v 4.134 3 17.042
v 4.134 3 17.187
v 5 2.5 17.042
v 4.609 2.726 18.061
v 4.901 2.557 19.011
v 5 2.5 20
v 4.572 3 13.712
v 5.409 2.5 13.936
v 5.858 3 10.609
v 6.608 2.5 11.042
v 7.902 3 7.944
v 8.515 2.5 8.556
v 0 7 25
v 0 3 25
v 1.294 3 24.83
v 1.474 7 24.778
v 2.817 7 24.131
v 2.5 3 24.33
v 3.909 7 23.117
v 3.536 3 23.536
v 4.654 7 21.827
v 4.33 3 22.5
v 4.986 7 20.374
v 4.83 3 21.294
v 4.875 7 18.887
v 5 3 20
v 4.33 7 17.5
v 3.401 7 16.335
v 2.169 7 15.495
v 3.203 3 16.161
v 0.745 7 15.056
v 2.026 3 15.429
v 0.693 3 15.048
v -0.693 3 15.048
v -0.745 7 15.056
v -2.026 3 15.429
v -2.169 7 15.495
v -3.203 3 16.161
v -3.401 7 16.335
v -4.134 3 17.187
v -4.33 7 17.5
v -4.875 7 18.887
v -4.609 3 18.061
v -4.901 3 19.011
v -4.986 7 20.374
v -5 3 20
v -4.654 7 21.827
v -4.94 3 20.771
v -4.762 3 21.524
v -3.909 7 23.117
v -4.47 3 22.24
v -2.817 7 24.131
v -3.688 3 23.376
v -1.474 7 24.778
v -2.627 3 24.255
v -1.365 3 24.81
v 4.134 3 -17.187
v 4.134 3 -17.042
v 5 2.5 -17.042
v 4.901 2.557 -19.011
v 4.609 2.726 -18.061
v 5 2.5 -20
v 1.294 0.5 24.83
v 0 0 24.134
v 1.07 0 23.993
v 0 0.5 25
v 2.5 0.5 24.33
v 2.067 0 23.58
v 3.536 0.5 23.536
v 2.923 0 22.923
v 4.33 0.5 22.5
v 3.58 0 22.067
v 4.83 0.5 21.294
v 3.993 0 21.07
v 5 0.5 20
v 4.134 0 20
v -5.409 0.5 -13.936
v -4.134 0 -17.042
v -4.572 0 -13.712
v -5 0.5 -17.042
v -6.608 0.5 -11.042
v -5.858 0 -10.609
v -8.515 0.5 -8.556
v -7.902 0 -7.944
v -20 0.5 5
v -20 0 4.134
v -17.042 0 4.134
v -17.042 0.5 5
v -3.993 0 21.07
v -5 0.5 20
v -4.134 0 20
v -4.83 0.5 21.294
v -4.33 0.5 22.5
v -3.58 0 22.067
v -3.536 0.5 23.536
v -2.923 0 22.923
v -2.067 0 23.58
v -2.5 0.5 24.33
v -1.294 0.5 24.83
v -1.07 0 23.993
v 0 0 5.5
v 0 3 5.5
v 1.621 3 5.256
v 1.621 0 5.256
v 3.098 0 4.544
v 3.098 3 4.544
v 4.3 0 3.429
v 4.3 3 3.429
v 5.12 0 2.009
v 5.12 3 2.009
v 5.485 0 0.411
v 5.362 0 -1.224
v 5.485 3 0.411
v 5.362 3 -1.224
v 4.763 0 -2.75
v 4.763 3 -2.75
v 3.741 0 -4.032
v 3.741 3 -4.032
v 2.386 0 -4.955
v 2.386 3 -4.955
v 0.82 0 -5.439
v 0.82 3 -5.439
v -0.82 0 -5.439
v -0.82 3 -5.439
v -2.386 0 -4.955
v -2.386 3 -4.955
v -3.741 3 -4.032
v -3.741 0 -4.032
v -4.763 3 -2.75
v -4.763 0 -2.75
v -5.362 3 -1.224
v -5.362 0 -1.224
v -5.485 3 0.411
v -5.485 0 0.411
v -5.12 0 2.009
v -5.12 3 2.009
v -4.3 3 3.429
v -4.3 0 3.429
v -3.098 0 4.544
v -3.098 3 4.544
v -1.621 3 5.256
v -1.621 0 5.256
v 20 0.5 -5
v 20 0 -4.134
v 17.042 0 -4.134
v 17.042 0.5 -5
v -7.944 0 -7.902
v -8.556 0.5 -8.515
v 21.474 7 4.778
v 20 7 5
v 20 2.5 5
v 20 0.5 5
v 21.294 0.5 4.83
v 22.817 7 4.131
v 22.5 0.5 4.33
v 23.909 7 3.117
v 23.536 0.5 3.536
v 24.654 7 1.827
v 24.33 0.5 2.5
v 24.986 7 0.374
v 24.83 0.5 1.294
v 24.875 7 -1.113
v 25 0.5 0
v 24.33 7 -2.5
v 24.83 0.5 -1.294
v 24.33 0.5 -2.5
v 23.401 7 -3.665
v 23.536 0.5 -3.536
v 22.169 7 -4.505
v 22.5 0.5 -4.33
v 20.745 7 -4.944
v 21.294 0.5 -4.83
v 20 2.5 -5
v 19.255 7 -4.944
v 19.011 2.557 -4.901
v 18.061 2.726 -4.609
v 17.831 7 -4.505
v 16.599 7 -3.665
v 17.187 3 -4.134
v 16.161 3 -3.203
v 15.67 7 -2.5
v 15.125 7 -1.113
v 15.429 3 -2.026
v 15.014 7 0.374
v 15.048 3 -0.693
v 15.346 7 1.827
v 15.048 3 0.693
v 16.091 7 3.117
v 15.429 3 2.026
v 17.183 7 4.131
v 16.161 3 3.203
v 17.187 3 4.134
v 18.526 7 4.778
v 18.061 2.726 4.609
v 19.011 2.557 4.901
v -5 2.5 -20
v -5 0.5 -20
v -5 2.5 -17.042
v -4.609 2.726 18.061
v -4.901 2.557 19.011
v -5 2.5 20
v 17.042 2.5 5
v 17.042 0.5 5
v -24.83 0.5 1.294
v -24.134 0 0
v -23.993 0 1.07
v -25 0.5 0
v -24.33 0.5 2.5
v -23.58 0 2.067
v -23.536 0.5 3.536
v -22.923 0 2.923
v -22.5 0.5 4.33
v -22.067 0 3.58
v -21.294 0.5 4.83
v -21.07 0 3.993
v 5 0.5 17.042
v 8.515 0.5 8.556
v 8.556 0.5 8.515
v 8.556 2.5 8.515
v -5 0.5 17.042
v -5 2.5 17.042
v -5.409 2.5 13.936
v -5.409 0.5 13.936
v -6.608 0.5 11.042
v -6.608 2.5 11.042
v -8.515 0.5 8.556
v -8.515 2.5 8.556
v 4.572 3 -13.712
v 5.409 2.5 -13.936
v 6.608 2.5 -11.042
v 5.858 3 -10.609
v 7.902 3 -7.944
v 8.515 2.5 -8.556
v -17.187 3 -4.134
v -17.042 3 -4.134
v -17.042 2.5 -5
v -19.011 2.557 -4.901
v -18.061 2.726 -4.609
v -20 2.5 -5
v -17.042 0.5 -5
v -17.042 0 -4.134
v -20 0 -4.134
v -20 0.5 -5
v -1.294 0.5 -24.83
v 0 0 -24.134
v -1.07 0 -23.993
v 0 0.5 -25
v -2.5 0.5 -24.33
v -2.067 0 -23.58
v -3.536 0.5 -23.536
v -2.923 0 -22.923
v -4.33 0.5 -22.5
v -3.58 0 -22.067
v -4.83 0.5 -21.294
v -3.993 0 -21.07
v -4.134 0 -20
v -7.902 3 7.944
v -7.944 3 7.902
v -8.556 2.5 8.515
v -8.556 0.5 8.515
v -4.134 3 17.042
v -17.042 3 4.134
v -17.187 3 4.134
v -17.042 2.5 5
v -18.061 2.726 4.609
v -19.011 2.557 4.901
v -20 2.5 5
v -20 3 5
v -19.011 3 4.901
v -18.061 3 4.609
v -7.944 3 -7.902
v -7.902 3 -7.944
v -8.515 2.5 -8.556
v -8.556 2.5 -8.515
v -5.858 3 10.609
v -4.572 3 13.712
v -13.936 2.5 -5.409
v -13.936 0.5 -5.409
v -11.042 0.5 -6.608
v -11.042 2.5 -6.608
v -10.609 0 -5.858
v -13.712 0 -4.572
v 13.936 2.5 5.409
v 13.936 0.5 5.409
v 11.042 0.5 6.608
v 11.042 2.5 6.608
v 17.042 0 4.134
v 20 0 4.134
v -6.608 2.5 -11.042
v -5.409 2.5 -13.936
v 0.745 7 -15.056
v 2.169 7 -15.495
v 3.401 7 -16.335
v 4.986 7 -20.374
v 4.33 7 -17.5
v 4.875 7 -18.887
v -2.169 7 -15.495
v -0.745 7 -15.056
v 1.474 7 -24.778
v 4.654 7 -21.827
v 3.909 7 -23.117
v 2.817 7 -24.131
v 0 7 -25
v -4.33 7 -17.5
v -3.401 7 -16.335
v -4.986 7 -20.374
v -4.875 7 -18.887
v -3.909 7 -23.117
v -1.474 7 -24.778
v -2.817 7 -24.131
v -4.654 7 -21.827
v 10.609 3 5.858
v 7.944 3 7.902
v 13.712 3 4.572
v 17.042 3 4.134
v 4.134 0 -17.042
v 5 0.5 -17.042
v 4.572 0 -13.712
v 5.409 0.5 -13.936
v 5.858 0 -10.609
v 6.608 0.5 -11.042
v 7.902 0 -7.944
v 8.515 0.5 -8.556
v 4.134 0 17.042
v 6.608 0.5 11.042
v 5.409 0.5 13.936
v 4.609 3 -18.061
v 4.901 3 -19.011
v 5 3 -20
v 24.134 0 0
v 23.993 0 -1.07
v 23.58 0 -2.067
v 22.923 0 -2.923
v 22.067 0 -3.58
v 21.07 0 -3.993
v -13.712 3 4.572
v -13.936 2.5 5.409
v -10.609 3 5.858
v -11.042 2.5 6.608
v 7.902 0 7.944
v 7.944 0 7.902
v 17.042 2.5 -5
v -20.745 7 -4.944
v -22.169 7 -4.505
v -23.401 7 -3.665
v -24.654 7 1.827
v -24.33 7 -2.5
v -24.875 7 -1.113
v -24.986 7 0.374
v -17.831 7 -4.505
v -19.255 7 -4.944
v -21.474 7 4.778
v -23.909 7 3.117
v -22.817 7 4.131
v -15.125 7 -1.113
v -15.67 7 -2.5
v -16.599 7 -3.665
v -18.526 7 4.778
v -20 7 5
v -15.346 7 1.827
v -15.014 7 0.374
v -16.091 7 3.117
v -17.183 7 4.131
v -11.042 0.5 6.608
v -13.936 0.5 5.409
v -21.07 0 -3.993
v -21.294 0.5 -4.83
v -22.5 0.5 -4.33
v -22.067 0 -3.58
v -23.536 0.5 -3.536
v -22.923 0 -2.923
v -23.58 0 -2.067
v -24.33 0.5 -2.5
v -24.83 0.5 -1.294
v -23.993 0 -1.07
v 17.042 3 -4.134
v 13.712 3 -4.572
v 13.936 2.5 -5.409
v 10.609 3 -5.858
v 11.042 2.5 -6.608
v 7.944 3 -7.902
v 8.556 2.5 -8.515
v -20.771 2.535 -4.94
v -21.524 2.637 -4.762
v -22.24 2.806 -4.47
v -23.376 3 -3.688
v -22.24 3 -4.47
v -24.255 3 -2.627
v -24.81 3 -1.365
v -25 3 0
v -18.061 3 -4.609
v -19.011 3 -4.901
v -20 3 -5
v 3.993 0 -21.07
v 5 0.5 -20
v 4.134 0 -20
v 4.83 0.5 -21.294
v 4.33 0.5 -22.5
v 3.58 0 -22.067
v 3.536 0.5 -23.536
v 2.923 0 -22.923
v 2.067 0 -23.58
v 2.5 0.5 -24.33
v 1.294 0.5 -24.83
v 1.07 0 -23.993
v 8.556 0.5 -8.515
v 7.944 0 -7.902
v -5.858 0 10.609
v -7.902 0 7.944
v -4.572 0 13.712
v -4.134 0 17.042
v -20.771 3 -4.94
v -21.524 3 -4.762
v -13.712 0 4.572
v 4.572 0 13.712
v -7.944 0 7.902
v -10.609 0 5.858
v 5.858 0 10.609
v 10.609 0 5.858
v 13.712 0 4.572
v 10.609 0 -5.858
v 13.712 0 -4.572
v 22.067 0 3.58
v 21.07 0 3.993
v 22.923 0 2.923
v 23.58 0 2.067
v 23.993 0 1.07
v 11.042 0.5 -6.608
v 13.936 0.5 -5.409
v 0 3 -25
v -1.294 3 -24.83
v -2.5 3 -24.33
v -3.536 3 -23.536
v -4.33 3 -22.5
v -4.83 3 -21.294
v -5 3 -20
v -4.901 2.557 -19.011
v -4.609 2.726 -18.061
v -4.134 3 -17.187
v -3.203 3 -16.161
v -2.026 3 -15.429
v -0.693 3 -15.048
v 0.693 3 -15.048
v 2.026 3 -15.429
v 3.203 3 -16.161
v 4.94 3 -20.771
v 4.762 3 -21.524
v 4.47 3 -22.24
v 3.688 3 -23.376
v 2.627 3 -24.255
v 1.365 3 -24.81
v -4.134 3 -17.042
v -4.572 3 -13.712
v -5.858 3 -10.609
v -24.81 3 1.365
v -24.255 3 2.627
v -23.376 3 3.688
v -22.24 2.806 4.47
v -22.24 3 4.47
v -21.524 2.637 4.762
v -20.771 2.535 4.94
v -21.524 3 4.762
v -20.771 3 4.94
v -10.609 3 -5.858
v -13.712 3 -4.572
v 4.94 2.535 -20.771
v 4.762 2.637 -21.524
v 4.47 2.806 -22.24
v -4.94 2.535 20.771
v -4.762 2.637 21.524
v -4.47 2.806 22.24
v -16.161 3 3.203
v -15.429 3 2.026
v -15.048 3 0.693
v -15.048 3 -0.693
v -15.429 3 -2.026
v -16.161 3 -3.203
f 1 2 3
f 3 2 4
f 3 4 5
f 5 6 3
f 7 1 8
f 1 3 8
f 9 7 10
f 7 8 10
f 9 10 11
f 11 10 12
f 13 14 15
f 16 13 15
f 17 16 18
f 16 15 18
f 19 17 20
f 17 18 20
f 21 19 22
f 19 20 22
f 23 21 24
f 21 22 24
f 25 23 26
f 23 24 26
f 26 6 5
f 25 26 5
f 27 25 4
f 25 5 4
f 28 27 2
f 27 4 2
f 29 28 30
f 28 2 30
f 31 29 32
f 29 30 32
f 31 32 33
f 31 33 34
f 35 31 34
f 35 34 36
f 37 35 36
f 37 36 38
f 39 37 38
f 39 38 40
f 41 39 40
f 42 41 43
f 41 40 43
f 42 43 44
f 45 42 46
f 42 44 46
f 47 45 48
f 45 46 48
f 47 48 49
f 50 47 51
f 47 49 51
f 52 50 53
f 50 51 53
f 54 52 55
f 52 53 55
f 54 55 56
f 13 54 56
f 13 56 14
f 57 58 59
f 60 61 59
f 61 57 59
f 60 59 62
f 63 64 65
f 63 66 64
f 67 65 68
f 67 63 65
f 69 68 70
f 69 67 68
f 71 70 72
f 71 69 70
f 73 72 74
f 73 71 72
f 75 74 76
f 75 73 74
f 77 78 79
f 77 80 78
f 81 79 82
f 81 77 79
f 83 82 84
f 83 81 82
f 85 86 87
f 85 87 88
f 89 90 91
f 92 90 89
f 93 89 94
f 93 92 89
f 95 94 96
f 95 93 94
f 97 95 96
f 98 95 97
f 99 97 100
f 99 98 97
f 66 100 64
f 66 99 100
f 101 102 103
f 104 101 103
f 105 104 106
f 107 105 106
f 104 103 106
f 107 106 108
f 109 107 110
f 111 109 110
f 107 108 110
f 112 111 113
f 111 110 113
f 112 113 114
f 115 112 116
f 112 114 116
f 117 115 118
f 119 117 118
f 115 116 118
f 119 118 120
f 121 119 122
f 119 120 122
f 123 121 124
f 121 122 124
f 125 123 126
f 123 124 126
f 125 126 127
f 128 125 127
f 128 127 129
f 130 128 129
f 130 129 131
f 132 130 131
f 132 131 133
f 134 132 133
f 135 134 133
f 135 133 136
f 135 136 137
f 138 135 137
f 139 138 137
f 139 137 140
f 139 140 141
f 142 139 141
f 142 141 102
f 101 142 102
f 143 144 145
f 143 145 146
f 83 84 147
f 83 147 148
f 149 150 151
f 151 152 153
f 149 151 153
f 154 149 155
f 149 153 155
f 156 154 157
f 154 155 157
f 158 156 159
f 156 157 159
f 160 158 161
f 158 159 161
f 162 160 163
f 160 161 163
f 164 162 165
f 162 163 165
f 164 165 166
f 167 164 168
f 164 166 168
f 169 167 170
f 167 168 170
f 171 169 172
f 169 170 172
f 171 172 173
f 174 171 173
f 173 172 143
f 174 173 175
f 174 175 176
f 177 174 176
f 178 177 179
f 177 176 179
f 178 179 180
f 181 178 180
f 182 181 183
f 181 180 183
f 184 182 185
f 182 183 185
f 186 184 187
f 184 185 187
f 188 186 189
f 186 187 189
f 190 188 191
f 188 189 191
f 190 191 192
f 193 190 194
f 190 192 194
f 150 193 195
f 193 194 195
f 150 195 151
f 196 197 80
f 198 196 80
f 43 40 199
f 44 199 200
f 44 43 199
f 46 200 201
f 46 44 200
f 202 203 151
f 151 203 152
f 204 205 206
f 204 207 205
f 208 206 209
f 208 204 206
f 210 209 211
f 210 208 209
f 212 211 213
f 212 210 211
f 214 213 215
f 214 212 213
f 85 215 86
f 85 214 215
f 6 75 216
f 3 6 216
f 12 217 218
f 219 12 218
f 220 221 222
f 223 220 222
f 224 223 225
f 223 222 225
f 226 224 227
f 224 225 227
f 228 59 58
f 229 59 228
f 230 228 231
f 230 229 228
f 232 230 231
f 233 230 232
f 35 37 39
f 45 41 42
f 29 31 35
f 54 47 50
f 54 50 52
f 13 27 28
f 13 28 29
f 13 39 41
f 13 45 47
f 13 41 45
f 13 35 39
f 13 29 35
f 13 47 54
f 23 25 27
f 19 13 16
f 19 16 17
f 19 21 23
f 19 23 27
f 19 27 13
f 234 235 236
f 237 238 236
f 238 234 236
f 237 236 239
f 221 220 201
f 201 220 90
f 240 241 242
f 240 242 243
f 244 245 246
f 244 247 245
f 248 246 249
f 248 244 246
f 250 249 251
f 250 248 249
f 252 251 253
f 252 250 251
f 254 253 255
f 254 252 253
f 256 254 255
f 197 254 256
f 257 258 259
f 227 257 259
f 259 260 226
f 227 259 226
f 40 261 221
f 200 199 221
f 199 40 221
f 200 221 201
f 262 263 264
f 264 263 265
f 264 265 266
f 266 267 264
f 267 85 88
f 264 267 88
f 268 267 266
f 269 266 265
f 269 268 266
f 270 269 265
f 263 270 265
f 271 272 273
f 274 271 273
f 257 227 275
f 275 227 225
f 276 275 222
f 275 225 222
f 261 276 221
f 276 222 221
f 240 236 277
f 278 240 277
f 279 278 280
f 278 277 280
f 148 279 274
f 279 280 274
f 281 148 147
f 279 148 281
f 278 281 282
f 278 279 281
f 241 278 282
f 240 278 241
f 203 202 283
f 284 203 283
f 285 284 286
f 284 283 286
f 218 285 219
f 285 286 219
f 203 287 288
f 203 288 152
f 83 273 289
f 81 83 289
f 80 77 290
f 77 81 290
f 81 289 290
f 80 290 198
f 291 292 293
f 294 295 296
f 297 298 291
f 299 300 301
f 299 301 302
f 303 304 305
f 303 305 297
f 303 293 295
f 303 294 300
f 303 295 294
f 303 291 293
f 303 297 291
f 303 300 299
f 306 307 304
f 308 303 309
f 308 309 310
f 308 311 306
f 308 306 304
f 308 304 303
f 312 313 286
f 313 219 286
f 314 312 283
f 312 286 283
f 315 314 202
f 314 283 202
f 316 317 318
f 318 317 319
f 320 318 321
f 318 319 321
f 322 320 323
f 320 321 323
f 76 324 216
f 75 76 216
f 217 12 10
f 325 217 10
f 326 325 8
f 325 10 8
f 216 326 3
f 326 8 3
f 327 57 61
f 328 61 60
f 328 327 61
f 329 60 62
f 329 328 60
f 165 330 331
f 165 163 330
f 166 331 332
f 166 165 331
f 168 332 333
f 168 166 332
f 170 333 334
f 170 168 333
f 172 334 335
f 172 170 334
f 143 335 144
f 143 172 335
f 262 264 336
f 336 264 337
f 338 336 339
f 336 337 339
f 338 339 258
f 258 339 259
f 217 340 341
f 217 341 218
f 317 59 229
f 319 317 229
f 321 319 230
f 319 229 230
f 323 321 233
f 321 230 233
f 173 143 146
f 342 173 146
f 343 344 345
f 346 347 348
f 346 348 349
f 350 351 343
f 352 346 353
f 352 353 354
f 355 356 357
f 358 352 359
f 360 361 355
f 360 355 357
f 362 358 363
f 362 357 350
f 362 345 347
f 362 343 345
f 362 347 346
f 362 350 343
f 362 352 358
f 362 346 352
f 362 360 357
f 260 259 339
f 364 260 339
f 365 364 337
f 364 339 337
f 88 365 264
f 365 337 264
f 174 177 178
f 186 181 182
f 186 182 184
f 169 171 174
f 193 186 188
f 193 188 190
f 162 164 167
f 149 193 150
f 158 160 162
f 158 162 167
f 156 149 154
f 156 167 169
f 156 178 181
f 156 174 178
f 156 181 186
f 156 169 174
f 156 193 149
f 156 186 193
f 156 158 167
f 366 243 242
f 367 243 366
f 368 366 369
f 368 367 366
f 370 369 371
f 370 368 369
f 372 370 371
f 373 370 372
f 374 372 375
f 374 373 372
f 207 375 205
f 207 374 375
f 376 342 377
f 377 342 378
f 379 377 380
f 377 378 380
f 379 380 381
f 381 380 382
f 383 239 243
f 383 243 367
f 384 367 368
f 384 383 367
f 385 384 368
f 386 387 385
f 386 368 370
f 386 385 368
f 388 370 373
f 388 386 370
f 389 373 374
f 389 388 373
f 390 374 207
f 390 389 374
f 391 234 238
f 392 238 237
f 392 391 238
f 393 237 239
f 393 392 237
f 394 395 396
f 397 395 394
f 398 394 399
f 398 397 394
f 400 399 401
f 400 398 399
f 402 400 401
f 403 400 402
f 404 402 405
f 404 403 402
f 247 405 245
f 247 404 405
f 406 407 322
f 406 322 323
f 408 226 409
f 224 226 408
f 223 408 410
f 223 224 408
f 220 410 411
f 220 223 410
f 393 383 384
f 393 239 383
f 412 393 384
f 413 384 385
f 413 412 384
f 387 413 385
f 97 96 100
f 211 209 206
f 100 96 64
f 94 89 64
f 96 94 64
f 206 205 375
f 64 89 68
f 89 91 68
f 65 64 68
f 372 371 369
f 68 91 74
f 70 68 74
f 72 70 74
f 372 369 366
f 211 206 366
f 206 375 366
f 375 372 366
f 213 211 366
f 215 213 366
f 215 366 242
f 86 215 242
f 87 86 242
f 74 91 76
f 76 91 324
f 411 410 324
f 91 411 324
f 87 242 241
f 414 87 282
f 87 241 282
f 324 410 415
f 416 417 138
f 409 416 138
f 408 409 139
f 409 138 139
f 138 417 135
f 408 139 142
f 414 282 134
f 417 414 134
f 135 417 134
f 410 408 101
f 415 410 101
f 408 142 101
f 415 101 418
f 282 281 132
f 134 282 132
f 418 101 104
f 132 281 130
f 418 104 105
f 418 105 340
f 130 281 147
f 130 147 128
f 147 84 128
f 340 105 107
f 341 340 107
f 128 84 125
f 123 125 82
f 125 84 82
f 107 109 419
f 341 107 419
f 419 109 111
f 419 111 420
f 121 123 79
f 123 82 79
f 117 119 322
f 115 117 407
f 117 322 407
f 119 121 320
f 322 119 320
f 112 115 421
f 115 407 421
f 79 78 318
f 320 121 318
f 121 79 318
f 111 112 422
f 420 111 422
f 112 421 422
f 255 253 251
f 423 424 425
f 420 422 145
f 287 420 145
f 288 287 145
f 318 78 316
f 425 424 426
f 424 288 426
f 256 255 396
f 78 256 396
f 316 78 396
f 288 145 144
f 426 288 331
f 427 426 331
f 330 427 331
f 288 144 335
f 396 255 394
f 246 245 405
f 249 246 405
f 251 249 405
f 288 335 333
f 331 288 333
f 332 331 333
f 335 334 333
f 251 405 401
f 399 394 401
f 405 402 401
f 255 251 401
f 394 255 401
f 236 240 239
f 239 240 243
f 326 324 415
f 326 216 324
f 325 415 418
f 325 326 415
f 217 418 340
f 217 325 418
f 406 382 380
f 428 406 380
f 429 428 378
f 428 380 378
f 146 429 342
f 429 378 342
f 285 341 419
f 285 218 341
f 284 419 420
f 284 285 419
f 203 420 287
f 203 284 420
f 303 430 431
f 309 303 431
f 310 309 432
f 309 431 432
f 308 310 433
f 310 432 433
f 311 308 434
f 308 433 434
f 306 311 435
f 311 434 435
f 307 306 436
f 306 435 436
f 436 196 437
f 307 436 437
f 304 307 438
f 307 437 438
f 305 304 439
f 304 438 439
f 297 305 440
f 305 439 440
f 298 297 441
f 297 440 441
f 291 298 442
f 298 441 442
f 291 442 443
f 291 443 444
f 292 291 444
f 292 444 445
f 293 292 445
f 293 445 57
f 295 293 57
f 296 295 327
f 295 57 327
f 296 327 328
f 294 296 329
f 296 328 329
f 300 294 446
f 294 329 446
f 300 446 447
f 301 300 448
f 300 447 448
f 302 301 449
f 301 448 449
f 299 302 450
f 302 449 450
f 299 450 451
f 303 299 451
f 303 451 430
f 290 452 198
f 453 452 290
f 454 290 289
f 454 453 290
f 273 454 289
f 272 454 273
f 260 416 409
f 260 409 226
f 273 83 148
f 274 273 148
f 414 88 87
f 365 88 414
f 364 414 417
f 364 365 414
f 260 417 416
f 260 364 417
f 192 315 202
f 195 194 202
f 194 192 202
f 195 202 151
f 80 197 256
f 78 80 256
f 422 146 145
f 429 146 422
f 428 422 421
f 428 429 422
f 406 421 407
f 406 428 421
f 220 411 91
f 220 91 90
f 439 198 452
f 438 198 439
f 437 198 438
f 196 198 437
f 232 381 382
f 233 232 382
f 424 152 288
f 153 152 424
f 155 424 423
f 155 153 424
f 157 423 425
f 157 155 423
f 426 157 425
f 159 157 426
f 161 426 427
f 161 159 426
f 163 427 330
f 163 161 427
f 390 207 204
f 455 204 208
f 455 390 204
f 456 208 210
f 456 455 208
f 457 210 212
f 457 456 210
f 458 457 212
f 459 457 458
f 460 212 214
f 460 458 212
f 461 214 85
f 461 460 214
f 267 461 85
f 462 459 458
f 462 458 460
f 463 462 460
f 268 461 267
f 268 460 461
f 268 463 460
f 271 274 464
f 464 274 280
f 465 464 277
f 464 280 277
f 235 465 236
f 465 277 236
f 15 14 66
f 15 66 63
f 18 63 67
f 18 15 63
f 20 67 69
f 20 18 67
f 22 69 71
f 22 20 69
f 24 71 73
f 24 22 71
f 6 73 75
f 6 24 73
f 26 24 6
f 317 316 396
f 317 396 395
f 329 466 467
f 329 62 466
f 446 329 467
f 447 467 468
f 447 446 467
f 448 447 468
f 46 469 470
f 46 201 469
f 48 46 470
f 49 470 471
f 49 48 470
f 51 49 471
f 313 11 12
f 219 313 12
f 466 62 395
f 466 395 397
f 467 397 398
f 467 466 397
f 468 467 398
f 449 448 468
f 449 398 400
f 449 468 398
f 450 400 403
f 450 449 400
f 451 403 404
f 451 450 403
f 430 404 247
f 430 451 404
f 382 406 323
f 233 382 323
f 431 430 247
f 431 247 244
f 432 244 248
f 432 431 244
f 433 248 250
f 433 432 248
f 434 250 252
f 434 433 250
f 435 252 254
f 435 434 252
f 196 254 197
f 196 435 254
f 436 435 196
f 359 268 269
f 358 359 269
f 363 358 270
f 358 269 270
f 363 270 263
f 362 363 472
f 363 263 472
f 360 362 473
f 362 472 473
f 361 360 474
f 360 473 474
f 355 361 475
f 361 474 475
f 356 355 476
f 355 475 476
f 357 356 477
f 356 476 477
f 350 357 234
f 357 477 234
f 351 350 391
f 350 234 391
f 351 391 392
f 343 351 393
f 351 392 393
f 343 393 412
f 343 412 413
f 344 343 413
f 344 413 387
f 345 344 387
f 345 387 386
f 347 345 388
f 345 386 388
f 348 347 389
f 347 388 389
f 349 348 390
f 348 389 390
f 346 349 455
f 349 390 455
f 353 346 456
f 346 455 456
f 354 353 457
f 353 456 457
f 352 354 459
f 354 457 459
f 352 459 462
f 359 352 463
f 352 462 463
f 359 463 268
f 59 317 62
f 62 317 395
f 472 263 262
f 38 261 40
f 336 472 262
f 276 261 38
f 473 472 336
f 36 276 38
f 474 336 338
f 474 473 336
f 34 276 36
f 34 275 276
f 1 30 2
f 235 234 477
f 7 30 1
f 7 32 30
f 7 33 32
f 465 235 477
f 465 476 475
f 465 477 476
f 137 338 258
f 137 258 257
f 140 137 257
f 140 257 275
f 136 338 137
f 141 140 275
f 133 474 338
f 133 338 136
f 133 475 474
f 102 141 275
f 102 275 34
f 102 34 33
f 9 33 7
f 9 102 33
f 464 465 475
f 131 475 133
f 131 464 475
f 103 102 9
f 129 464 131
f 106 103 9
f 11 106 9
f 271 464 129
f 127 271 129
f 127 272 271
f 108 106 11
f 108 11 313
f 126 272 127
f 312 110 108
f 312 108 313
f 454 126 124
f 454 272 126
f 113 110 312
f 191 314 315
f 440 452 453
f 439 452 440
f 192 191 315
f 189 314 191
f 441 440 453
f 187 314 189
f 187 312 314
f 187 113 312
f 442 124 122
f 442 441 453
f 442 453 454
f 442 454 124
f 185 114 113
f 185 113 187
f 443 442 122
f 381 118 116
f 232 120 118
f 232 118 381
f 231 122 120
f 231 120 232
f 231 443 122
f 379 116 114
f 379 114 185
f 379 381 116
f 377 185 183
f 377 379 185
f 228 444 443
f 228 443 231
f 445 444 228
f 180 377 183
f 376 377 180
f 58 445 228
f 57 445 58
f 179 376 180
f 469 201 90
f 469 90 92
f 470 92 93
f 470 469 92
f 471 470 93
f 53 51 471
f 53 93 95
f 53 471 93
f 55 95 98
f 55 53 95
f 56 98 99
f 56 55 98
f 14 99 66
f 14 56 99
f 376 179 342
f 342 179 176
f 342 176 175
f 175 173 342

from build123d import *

# Parameters (mm, degrees)
BOSS_EXTRUDE2_DEPTH = 3
SKETCH3_R           = 5
BOSS_EXTRUDE3_DEPTH = 4
FILLET2_R           = 12
CUT_EXTRUDE1_REACH  = 37.581
SKETCH4_R           = 5.5
CHAMFER1_SIZE       = 0.866025404
CHAMFER1_SIZE_2     = 0.5


with BuildPart() as part:
    # Sketch2 → Boss-Extrude2 (new body)
    with BuildSketch(Plane(origin=(0, 0, 0), x_dir=(1, 0, 0), z_dir=(0, 1, 0))):
        Polygon((-5, 25), (-5, 12.071067812), (-12.071067812, 5), (-25, 5), (-25, -5), (-12.071067812, -5), (-5, -12.071067812), (-5, -25), (5, -25), (5, -12.071067812), (12.071067812, -5), (25, -5), (25, 5), (12.071067812, 5), (5, 12.071067812), (5, 25), align=None)
    extrude(amount=BOSS_EXTRUDE2_DEPTH)

    # Sketch3 → Boss-Extrude3 (add)
    with BuildSketch(Plane(origin=(0, 3, 0), x_dir=(1, 0, 0), z_dir=(0, 1, 0))):
        with Locations(Location((-20, 0, 0), (0, 0, 270))):
            Circle(SKETCH3_R)
        with Locations(Location((0, 20, 0), (0, 0, 90))):
            Circle(SKETCH3_R)
        with Locations(Location((20, 0, 0), (0, 0, 270))):
            Circle(SKETCH3_R)
        with Locations(Location((0, -20, 0), (0, 0, 270))):
            Circle(SKETCH3_R)
    extrude(amount=BOSS_EXTRUDE3_DEPTH)

    # Fillet2
    fillet2_edges = [part.edges().sort_by_distance(p)[0] for p in [
        (5, 1.5, -12.071067812),
        (12.071067812, 1.5, -5),
        (12.071067812, 1.5, 5),
        (5, 1.5, 12.071067812),
        (-5, 1.5, 12.071067812),
        (-12.071067812, 1.5, 5),
        (-12.071067812, 1.5, -5),
        (-5, 1.5, -12.071067812),
    ]]
    fillet(fillet2_edges, radius=FILLET2_R)

    # Sketch4 → Cut-Extrude1 (cut, up to next)
    with BuildSketch(Plane(origin=(0, 3, 0), x_dir=(1, 0, 0), z_dir=(0, 1, 0)), mode=Mode.PRIVATE) as cut_extrude1_sk1:
        with BuildLine():
            ThreePointArc((-25, 0), (-23.535533906, -3.535533906), (-20, -5))
            Line((-20, -5), (-25, -5))
            Line((-25, -5), (-25, 0))
        make_face()
    cut_extrude1_tool1 = extrude(cut_extrude1_sk1.sketch, amount=-CUT_EXTRUDE1_REACH, mode=Mode.PRIVATE) & part.part
    # Sketch4 → Cut-Extrude1 (cut, up to next)
    with BuildSketch(Plane(origin=(0, 3, 0), x_dir=(1, 0, 0), z_dir=(0, 1, 0)), mode=Mode.PRIVATE) as cut_extrude1_sk2:
        with BuildLine():
            ThreePointArc((-20, 5), (-23.535533906, 3.535533906), (-25, 0))
            Line((-25, 0), (-25, 5))
            Line((-25, 5), (-20, 5))
        make_face()
    cut_extrude1_tool2 = extrude(cut_extrude1_sk2.sketch, amount=-CUT_EXTRUDE1_REACH, mode=Mode.PRIVATE) & part.part
    # Sketch4 → Cut-Extrude1 (cut, up to next)
    with BuildSketch(Plane(origin=(0, 3, 0), x_dir=(1, 0, 0), z_dir=(0, 1, 0)), mode=Mode.PRIVATE) as cut_extrude1_sk3:
        with BuildLine():
            ThreePointArc((0, 25), (-3.535533906, 23.535533906), (-5, 20))
            Line((-5, 20), (-5, 25))
            Line((-5, 25), (0, 25))
        make_face()
    cut_extrude1_tool3 = extrude(cut_extrude1_sk3.sketch, amount=-CUT_EXTRUDE1_REACH, mode=Mode.PRIVATE) & part.part
    # Sketch4 → Cut-Extrude1 (cut, up to next)
    with BuildSketch(Plane(origin=(0, 3, 0), x_dir=(1, 0, 0), z_dir=(0, 1, 0)), mode=Mode.PRIVATE) as cut_extrude1_sk4:
        with BuildLine():
            ThreePointArc((5, 20), (3.535533906, 23.535533906), (0, 25))
            Line((0, 25), (5, 25))
            Line((5, 25), (5, 20))
        make_face()
    cut_extrude1_tool4 = extrude(cut_extrude1_sk4.sketch, amount=-CUT_EXTRUDE1_REACH, mode=Mode.PRIVATE) & part.part
    # Sketch4 → Cut-Extrude1 (cut, up to next)
    with BuildSketch(Plane(origin=(0, 3, 0), x_dir=(1, 0, 0), z_dir=(0, 1, 0)), mode=Mode.PRIVATE) as cut_extrude1_sk5:
        with BuildLine():
            ThreePointArc((25, 0), (23.535533906, 3.535533906), (20, 5))
            Line((20, 5), (25, 5))
            Line((25, 5), (25, 0))
        make_face()
    cut_extrude1_tool5 = extrude(cut_extrude1_sk5.sketch, amount=-CUT_EXTRUDE1_REACH, mode=Mode.PRIVATE) & part.part
    # Sketch4 → Cut-Extrude1 (cut, up to next)
    with BuildSketch(Plane(origin=(0, 3, 0), x_dir=(1, 0, 0), z_dir=(0, 1, 0)), mode=Mode.PRIVATE) as cut_extrude1_sk6:
        with BuildLine():
            ThreePointArc((20, -5), (23.535533906, -3.535533906), (25, 0))
            Line((25, 0), (25, -5))
            Line((25, -5), (20, -5))
        make_face()
    cut_extrude1_tool6 = extrude(cut_extrude1_sk6.sketch, amount=-CUT_EXTRUDE1_REACH, mode=Mode.PRIVATE) & part.part
    # Sketch4 → Cut-Extrude1 (cut, up to next)
    with BuildSketch(Plane(origin=(0, 3, 0), x_dir=(1, 0, 0), z_dir=(0, 1, 0)), mode=Mode.PRIVATE) as cut_extrude1_sk7:
        with BuildLine():
            ThreePointArc((0, -25), (3.535533906, -23.535533906), (5, -20))
            Line((5, -20), (5, -25))
            Line((5, -25), (0, -25))
        make_face()
    cut_extrude1_tool7 = extrude(cut_extrude1_sk7.sketch, amount=-CUT_EXTRUDE1_REACH, mode=Mode.PRIVATE) & part.part
    # Sketch4 → Cut-Extrude1 (cut, up to next)
    with BuildSketch(Plane(origin=(0, 3, 0), x_dir=(1, 0, 0), z_dir=(0, 1, 0)), mode=Mode.PRIVATE) as cut_extrude1_sk8:
        with BuildLine():
            ThreePointArc((-5, -20), (-3.535533906, -23.535533906), (0, -25))
            Line((0, -25), (-5, -25))
            Line((-5, -25), (-5, -20))
        make_face()
    cut_extrude1_tool8 = extrude(cut_extrude1_sk8.sketch, amount=-CUT_EXTRUDE1_REACH, mode=Mode.PRIVATE) & part.part
    # Sketch4 → Cut-Extrude1 (cut, up to next)
    with BuildSketch(Plane(origin=(0, 3, 0), x_dir=(1, 0, 0), z_dir=(0, 1, 0)), mode=Mode.PRIVATE) as cut_extrude1_sk9:
        with Locations(Location((0, 0, 0), (0, 0, 270))):
            Circle(SKETCH4_R)
    cut_extrude1_tool9 = extrude(cut_extrude1_sk9.sketch, amount=-CUT_EXTRUDE1_REACH, mode=Mode.PRIVATE) & part.part
    add(cut_extrude1_tool1.solids().sort_by_distance((-23.88316, 3, 3.88316))[0], mode=Mode.SUBTRACT)
    add(cut_extrude1_tool2.solids().sort_by_distance((-23.88316, 3, -3.88316))[0], mode=Mode.SUBTRACT)
    add(cut_extrude1_tool3.solids().sort_by_distance((-3.88316, 3, -23.88316))[0], mode=Mode.SUBTRACT)
    add(cut_extrude1_tool4.solids().sort_by_distance((3.88316, 3, -23.88316))[0], mode=Mode.SUBTRACT)
    add(cut_extrude1_tool5.solids().sort_by_distance((23.88316, 3, -3.88316))[0], mode=Mode.SUBTRACT)
    add(cut_extrude1_tool6.solids().sort_by_distance((23.88316, 3, 3.88316))[0], mode=Mode.SUBTRACT)
    add(cut_extrude1_tool7.solids().sort_by_distance((3.88316, 3, 23.88316))[0], mode=Mode.SUBTRACT)
    add(cut_extrude1_tool8.solids().sort_by_distance((-3.88316, 3, 23.88316))[0], mode=Mode.SUBTRACT)
    add(cut_extrude1_tool9.solids().sort_by_distance((0, 3, 0))[0], mode=Mode.SUBTRACT)

    # Chamfer1
    # the kernel refuses this chamfer: 0.866025404, 0.5 mm, written as the material it takes off along each edge
    with BuildSketch(Plane(origin=(17.04163056, 3, 17), x_dir=(-0.7071067811865476, 0, -0.7071067811865475), z_dir=(-0.7071067811865475, 0, 0.7071067811865476))) as chamfer1_piece_1:
        Polygon((12 + CHAMFER1_SIZE, 0), (12, CHAMFER1_SIZE_2), (12, 0), align=None)
    revolve(axis=Axis((17.04163056, 3, 17), (0, -1, 0)), revolution_arc=45, mode=Mode.SUBTRACT)
    with BuildSketch(Plane(origin=(17.04163056, 0, 17), x_dir=(-0.7071067811865476, 0, -0.7071067811865475), z_dir=(-0.7071067811865475, 0, 0.7071067811865476))) as chamfer1_piece_2:
        Polygon((12 + CHAMFER1_SIZE, 0), (12, -CHAMFER1_SIZE_2), (12, 0), align=None)
    revolve(axis=Axis((17.04163056, 0, 17), (0, -1, 0)), revolution_arc=45, mode=Mode.SUBTRACT)
    with BuildSketch(Plane(origin=(17, 0, 17.04163056), x_dir=(-1, 0, 0), z_dir=(0, 0, 1))) as chamfer1_piece_3:
        Polygon((12 + CHAMFER1_SIZE, 0), (12, -CHAMFER1_SIZE_2), (12, 0), align=None)
    revolve(axis=Axis((17, 0, 17.04163056), (0, -1, 0)), revolution_arc=45, mode=Mode.SUBTRACT)
    with BuildSketch(Plane(origin=(17, 3, 17.04163056), x_dir=(-1, 0, 0), z_dir=(0, 0, 1))) as chamfer1_piece_4:
        Polygon((12 + CHAMFER1_SIZE, 0), (12, CHAMFER1_SIZE_2), (12, 0), align=None)
    revolve(axis=Axis((17, 3, 17.04163056), (0, -1, 0)), revolution_arc=45, mode=Mode.SUBTRACT)
    with BuildSketch(Plane(origin=(5, 0, 20), x_dir=(-0.9998132206222079, -0.019326765612700636, 0), z_dir=(0, 0, -1)), Plane(origin=(-20, 0, 5), x_dir=(0, -0.019326765612700636, -0.9998132206222079), z_dir=(1, 0, 0)), Plane(origin=(20, 0, -5), x_dir=(0, -0.019326765612700636, 0.9998132206222079), z_dir=(-1, 0, 0)), Plane(origin=(-5, 0, 17.04163056), x_dir=(0.9998132206222079, -0.019326765612700636, 0), z_dir=(0, 0, 1)), Plane(origin=(-17.04163056, 0, -5), x_dir=(0, -0.019326765612700636, 0.9998132206222079), z_dir=(-1, 0, 0)), Plane(origin=(5, 0, -17.04163056), x_dir=(-0.9998132206222079, -0.019326765612700636, 0), z_dir=(0, 0, -1)), Plane(origin=(17.04163056, 0, 5), x_dir=(0, -0.019326765612700636, -0.9998132206222079), z_dir=(1, 0, 0))) as chamfer1_piece_5:
        Polygon((CHAMFER1_SIZE * 0.999813220373, CHAMFER1_SIZE * 0.0193267656079), (-CHAMFER1_SIZE_2 * 0.0193267656127, CHAMFER1_SIZE_2 * 0.999813220622), (0, 0), align=None)
    extrude(amount=2.95836944, mode=Mode.SUBTRACT)
    with BuildSketch(Plane(origin=(5, 3, 22.240481985), x_dir=(-0.9998132206222079, 0.019326765612700702, 0), z_dir=(0, 0, -1))) as chamfer1_piece_6_section:
        Polygon((CHAMFER1_SIZE * 0.999813220373, -CHAMFER1_SIZE * 0.0193267656079), (-CHAMFER1_SIZE_2 * 0.0193267656127, -CHAMFER1_SIZE_2 * 0.999813220622), (0, 0), align=None)
    chamfer1_piece_6 = extrude(amount=5.198851425, mode=Mode.PRIVATE)
    chamfer1_piece_6 = chamfer1_piece_6 - Plane(origin=(0, 2.808146468, 20), x_dir=(0, 0, 1), z_dir=(0, 1, 0)) * Cylinder(5, 14, mode=Mode.PRIVATE)
    add(chamfer1_piece_6, mode=Mode.SUBTRACT)
    with BuildSketch(Plane(origin=(-5, 0, -20), x_dir=(-0.057893862402671484, 0.9983227437537926, 0), z_dir=(0, 0, 1))) as chamfer1_piece_7:
        Polygon((CHAMFER1_SIZE_2 * 0.998322743754, -CHAMFER1_SIZE_2 * 0.0578938624027), (-CHAMFER1_SIZE * 0.0578938623883, -CHAMFER1_SIZE * 0.998322743505), (0, 0), align=None)
    extrude(amount=2.95836944, mode=Mode.SUBTRACT)
    with BuildSketch(Plane(origin=(-5, 3, -22.240481983), x_dir=(-0.05789386240267147, -0.9983227437537926, 0), z_dir=(0, 0, 1))) as chamfer1_piece_8_section:
        Polygon((CHAMFER1_SIZE_2 * 0.998322743754, CHAMFER1_SIZE_2 * 0.0578938624027), (-CHAMFER1_SIZE * 0.0578938623883, CHAMFER1_SIZE * 0.998322743505), (0, 0), align=None)
    chamfer1_piece_8 = extrude(amount=5.198851422, mode=Mode.PRIVATE)
    chamfer1_piece_8 = chamfer1_piece_8 - Plane(origin=(0, 2.808146468, -20), x_dir=(0, 0, -1), z_dir=(0, 1, 0)) * Cylinder(5, 14, mode=Mode.PRIVATE)
    add(chamfer1_piece_8, mode=Mode.SUBTRACT)
    with BuildSketch(Plane(origin=(0, 0, 20), x_dir=(-1, 0, 0), z_dir=(0, 0, -1))) as chamfer1_piece_9:
        Polygon((5 - CHAMFER1_SIZE, 0), (5, CHAMFER1_SIZE_2), (5, 0), align=None)
    revolve(axis=Axis((0, 0, 20), (0, 1, 0)), revolution_arc=90, mode=Mode.SUBTRACT)
    with BuildSketch(Plane(origin=(20, 0, 0), x_dir=(0, 0, 1), z_dir=(-1, 0, 0))) as chamfer1_piece_10:
        Polygon((5 - CHAMFER1_SIZE, 0), (5, CHAMFER1_SIZE_2), (5, 0), align=None)
    revolve(axis=Axis((20, 0, 0), (0, 1, 0)), revolution_arc=90, mode=Mode.SUBTRACT)
    with BuildSketch(Plane(origin=(0, 0, -20), x_dir=(1, 0, 0), z_dir=(0, 0, 1))) as chamfer1_piece_11:
        Polygon((5 - CHAMFER1_SIZE, 0), (5, CHAMFER1_SIZE_2), (5, 0), align=None)
    revolve(axis=Axis((0, 0, -20), (0, 1, 0)), revolution_arc=90, mode=Mode.SUBTRACT)
    with BuildSketch(Plane(origin=(-20, 0, 0), x_dir=(0, 0, -1), z_dir=(1, 0, 0))) as chamfer1_piece_12:
        Polygon((5 - CHAMFER1_SIZE, 0), (5, CHAMFER1_SIZE_2), (5, 0), align=None)
    revolve(axis=Axis((-20, 0, 0), (0, 1, 0)), revolution_arc=90, mode=Mode.SUBTRACT)
    with BuildSketch(Plane(origin=(-22.240481985, 3, 5), x_dir=(0, 0.019326765612700702, -0.9998132206222079), z_dir=(1, 0, 0))) as chamfer1_piece_13_section:
        Polygon((CHAMFER1_SIZE * 0.999813220373, -CHAMFER1_SIZE * 0.0193267656079), (-CHAMFER1_SIZE_2 * 0.0193267656127, -CHAMFER1_SIZE_2 * 0.999813220622), (0, 0), align=None)
    chamfer1_piece_13 = extrude(amount=5.198851425, mode=Mode.PRIVATE)
    chamfer1_piece_13 = chamfer1_piece_13 - Plane(origin=(-20, 2.808146468, 0), x_dir=(-1, 0, 0), z_dir=(0, 1, 0)) * Cylinder(5, 14, mode=Mode.PRIVATE)
    add(chamfer1_piece_13, mode=Mode.SUBTRACT)
    with BuildSketch(Plane(origin=(22.240481985, 3, -5), x_dir=(0, 0.019326765612700702, 0.9998132206222079), z_dir=(-1, 0, 0))) as chamfer1_piece_14_section:
        Polygon((CHAMFER1_SIZE * 0.999813220373, -CHAMFER1_SIZE * 0.0193267656079), (-CHAMFER1_SIZE_2 * 0.0193267656127, -CHAMFER1_SIZE_2 * 0.999813220622), (0, 0), align=None)
    chamfer1_piece_14 = extrude(amount=5.198851425, mode=Mode.PRIVATE)
    chamfer1_piece_14 = chamfer1_piece_14 - Plane(origin=(20, 2.808146468, 0), x_dir=(1, 0, 0), z_dir=(0, 1, 0)) * Cylinder(5, 14, mode=Mode.PRIVATE)
    add(chamfer1_piece_14, mode=Mode.SUBTRACT)
    with BuildSketch(Plane(origin=(-8.556349186, 0, 8.514718626), x_dir=(0.7069747082219248, -0.01932676561270064, -0.7069747082219251), z_dir=(0.7071067811865477, 0, 0.7071067811865475)), Plane(origin=(-8.514718626, 0, -8.556349186), x_dir=(0.706974708221925, -0.01932676561270064, 0.706974708221925), z_dir=(-0.7071067811865475, 0, 0.7071067811865476)), Plane(origin=(8.556349186, 0, -8.514718626), x_dir=(-0.706974708221925, -0.01932676561270064, 0.706974708221925), z_dir=(-0.7071067811865476, 0, -0.7071067811865476)), Plane(origin=(8.514718626, 0, 8.556349186), x_dir=(-0.7069747082219248, -0.01932676561270064, -0.7069747082219251), z_dir=(0.7071067811865477, 0, -0.7071067811865475))) as chamfer1_piece_15:
        Polygon((CHAMFER1_SIZE * 0.999813220373, CHAMFER1_SIZE * 0.0193267656079), (-CHAMFER1_SIZE_2 * 0.0193267656127, CHAMFER1_SIZE_2 * 0.999813220622), (0, 0), align=None)
    extrude(amount=0.058874503, mode=Mode.SUBTRACT)
    with BuildSketch(Plane(origin=(-8.556349186, 3, 8.514718626), x_dir=(0.7069747082219248, 0.019326765612700702, -0.7069747082219251), z_dir=(0.7071067811865477, 0, 0.7071067811865475)), Plane(origin=(-8.514718626, 3, -8.556349186), x_dir=(0.706974708221925, 0.019326765612700702, 0.706974708221925), z_dir=(-0.7071067811865475, 0, 0.7071067811865476)), Plane(origin=(8.556349186, 3, -8.514718626), x_dir=(-0.706974708221925, 0.019326765612700702, 0.706974708221925), z_dir=(-0.7071067811865476, 0, -0.7071067811865476)), Plane(origin=(8.514718626, 3, 8.556349186), x_dir=(-0.7069747082219248, 0.019326765612700702, -0.7069747082219251), z_dir=(0.7071067811865477, 0, -0.7071067811865475))) as chamfer1_piece_16:
        Polygon((CHAMFER1_SIZE * 0.999813220373, -CHAMFER1_SIZE * 0.0193267656079), (-CHAMFER1_SIZE_2 * 0.0193267656127, -CHAMFER1_SIZE_2 * 0.999813220622), (0, 0), align=None)
    extrude(amount=0.058874503, mode=Mode.SUBTRACT)
    with BuildSketch(Plane(origin=(-5, 3, 17.04163056), x_dir=(0.9998132206222079, 0.019326765612700702, 0), z_dir=(0, 0, 1))) as chamfer1_piece_17_section:
        Polygon((CHAMFER1_SIZE * 0.999813220373, -CHAMFER1_SIZE * 0.0193267656079), (-CHAMFER1_SIZE_2 * 0.0193267656127, -CHAMFER1_SIZE_2 * 0.999813220622), (0, 0), align=None)
    chamfer1_piece_17 = extrude(amount=5.198851425, mode=Mode.PRIVATE)
    chamfer1_piece_17 = chamfer1_piece_17 - Plane(origin=(0, 2.808146468, 20), x_dir=(-1, 0, 0), z_dir=(0, 1, 0)) * Cylinder(5, 14, mode=Mode.PRIVATE)
    add(chamfer1_piece_17, mode=Mode.SUBTRACT)
    with BuildSketch(Plane(origin=(-17.04163056, 3, -5), x_dir=(0, 0.019326765612700702, 0.9998132206222079), z_dir=(-1, 0, 0))) as chamfer1_piece_18_section:
        Polygon((CHAMFER1_SIZE * 0.999813220373, -CHAMFER1_SIZE * 0.0193267656079), (-CHAMFER1_SIZE_2 * 0.0193267656127, -CHAMFER1_SIZE_2 * 0.999813220622), (0, 0), align=None)
    chamfer1_piece_18 = extrude(amount=5.198851425, mode=Mode.PRIVATE)
    chamfer1_piece_18 = chamfer1_piece_18 - Plane(origin=(-20, 2.808146468, 0), x_dir=(0, 0, -1), z_dir=(0, 1, 0)) * Cylinder(5, 14, mode=Mode.PRIVATE)
    add(chamfer1_piece_18, mode=Mode.SUBTRACT)
    with BuildSketch(Plane(origin=(5, 3, -17.04163056), x_dir=(-0.9998132206222079, 0.019326765612700702, 0), z_dir=(0, 0, -1))) as chamfer1_piece_19_section:
        Polygon((CHAMFER1_SIZE * 0.999813220373, -CHAMFER1_SIZE * 0.0193267656079), (-CHAMFER1_SIZE_2 * 0.0193267656127, -CHAMFER1_SIZE_2 * 0.999813220622), (0, 0), align=None)
    chamfer1_piece_19 = extrude(amount=5.198851425, mode=Mode.PRIVATE)
    chamfer1_piece_19 = chamfer1_piece_19 - Plane(origin=(0, 2.808146468, -20), x_dir=(1, 0, 0), z_dir=(0, 1, 0)) * Cylinder(5, 14, mode=Mode.PRIVATE)
    add(chamfer1_piece_19, mode=Mode.SUBTRACT)
    with BuildSketch(Plane(origin=(17.04163056, 3, 5), x_dir=(0, 0.019326765612700702, -0.9998132206222079), z_dir=(1, 0, 0))) as chamfer1_piece_20_section:
        Polygon((CHAMFER1_SIZE * 0.999813220373, -CHAMFER1_SIZE * 0.0193267656079), (-CHAMFER1_SIZE_2 * 0.0193267656127, -CHAMFER1_SIZE_2 * 0.999813220622), (0, 0), align=None)
    chamfer1_piece_20 = extrude(amount=5.198851425, mode=Mode.PRIVATE)
    chamfer1_piece_20 = chamfer1_piece_20 - Plane(origin=(20, 2.808146468, 0), x_dir=(0, 0, 1), z_dir=(0, 1, 0)) * Cylinder(5, 14, mode=Mode.PRIVATE)
    add(chamfer1_piece_20, mode=Mode.SUBTRACT)
    with BuildSketch(Plane(origin=(-17.04163056, 0, 17), x_dir=(0, 0, -1), z_dir=(-1, 0, 0))) as chamfer1_piece_21:
        Polygon((12 + CHAMFER1_SIZE, 0), (12, -CHAMFER1_SIZE_2), (12, 0), align=None)
    revolve(axis=Axis((-17.04163056, 0, 17), (0, -1, 0)), revolution_arc=45, mode=Mode.SUBTRACT)
    with BuildSketch(Plane(origin=(-17.04163056, 3, 17), x_dir=(0, 0, -1), z_dir=(-1, 0, 0))) as chamfer1_piece_22:
        Polygon((12 + CHAMFER1_SIZE, 0), (12, CHAMFER1_SIZE_2), (12, 0), align=None)
    revolve(axis=Axis((-17.04163056, 3, 17), (0, -1, 0)), revolution_arc=45, mode=Mode.SUBTRACT)
    with BuildSketch(Plane(origin=(-17, 0, 17.04163056), x_dir=(0.7071067811865475, 0, -0.7071067811865476), z_dir=(-0.7071067811865476, 0, -0.7071067811865475))) as chamfer1_piece_23:
        Polygon((12 + CHAMFER1_SIZE, 0), (12, -CHAMFER1_SIZE_2), (12, 0), align=None)
    revolve(axis=Axis((-17, 0, 17.04163056), (0, -1, 0)), revolution_arc=45, mode=Mode.SUBTRACT)
    with BuildSketch(Plane(origin=(-17, 3, 17.04163056), x_dir=(0.7071067811865475, 0, -0.7071067811865476), z_dir=(-0.7071067811865476, 0, -0.7071067811865475))) as chamfer1_piece_24:
        Polygon((12 + CHAMFER1_SIZE, 0), (12, CHAMFER1_SIZE_2), (12, 0), align=None)
    revolve(axis=Axis((-17, 3, 17.04163056), (0, -1, 0)), revolution_arc=45, mode=Mode.SUBTRACT)
    with BuildSketch(Plane(origin=(-17.04163056, 0, -17), x_dir=(0.7071067811865477, 0, 0.7071067811865475), z_dir=(0.7071067811865475, 0, -0.7071067811865477))) as chamfer1_piece_25:
        Polygon((12 + CHAMFER1_SIZE, 0), (12, -CHAMFER1_SIZE_2), (12, 0), align=None)
    revolve(axis=Axis((-17.04163056, 0, -17), (0, -1, 0)), revolution_arc=45, mode=Mode.SUBTRACT)
    with BuildSketch(Plane(origin=(-17.04163056, 3, -17), x_dir=(0.7071067811865477, 0, 0.7071067811865475), z_dir=(0.7071067811865475, 0, -0.7071067811865477))) as chamfer1_piece_26:
        Polygon((12 + CHAMFER1_SIZE, 0), (12, CHAMFER1_SIZE_2), (12, 0), align=None)
    revolve(axis=Axis((-17.04163056, 3, -17), (0, -1, 0)), revolution_arc=45, mode=Mode.SUBTRACT)
    with BuildSketch(Plane(origin=(-17, 0, -17.04163056), x_dir=(1, 0, 0), z_dir=(0, 0, -1))) as chamfer1_piece_27:
        Polygon((12 + CHAMFER1_SIZE, 0), (12, -CHAMFER1_SIZE_2), (12, 0), align=None)
    revolve(axis=Axis((-17, 0, -17.04163056), (0, -1, 0)), revolution_arc=45, mode=Mode.SUBTRACT)
    with BuildSketch(Plane(origin=(-17, 3, -17.04163056), x_dir=(1, 0, 0), z_dir=(0, 0, -1))) as chamfer1_piece_28:
        Polygon((12, CHAMFER1_SIZE_2), (12 + CHAMFER1_SIZE, 0), (12, 0), align=None)
    revolve(axis=Axis((-17, 3, -17.04163056), (0, -1, 0)), revolution_arc=45, mode=Mode.SUBTRACT)
    with BuildSketch(Plane(origin=(17, 0, -17.04163056), x_dir=(-1, 0, 0), z_dir=(0, 0, -1))) as chamfer1_piece_29:
        Polygon((12 + CHAMFER1_SIZE, 0), (12, CHAMFER1_SIZE_2), (12, 0), align=None)
    revolve(axis=Axis((17, 0, -17.04163056), (0, 1, 0)), revolution_arc=45, mode=Mode.SUBTRACT)
    with BuildSketch(Plane(origin=(17, 3, -17.04163056), x_dir=(-1, 0, 0), z_dir=(0, 0, -1))) as chamfer1_piece_30:
        Polygon((12 + CHAMFER1_SIZE, 0), (12, -CHAMFER1_SIZE_2), (12, 0), align=None)
    revolve(axis=Axis((17, 3, -17.04163056), (0, 1, 0)), revolution_arc=45, mode=Mode.SUBTRACT)
    with BuildSketch(Plane(origin=(17.04163056, 0, -17), x_dir=(0, 0, 1), z_dir=(1, 0, 0))) as chamfer1_piece_31:
        Polygon((12 + CHAMFER1_SIZE, 0), (12, -CHAMFER1_SIZE_2), (12, 0), align=None)
    revolve(axis=Axis((17.04163056, 0, -17), (0, -1, 0)), revolution_arc=45, mode=Mode.SUBTRACT)
    with BuildSketch(Plane(origin=(17.04163056, 3, -17), x_dir=(0, 0, 1), z_dir=(1, 0, 0))) as chamfer1_piece_32:
        Polygon((12 + CHAMFER1_SIZE, 0), (12, CHAMFER1_SIZE_2), (12, 0), align=None)
    revolve(axis=Axis((17.04163056, 3, -17), (0, -1, 0)), revolution_arc=45, mode=Mode.SUBTRACT)
    with BuildSketch(Plane(origin=(20, 0, 0), x_dir=(1, 0, 0), z_dir=(0, 0, 1))) as chamfer1_piece_33:
        Polygon((5 - CHAMFER1_SIZE, 0), (5, CHAMFER1_SIZE_2), (5, 0), align=None)
    revolve(axis=Axis((20, 0, 0), (0, 1, 0)), revolution_arc=90, mode=Mode.SUBTRACT)
    with BuildSketch(Plane(origin=(-20, 0, 0), x_dir=(-1, 0, 0), z_dir=(0, 0, -1))) as chamfer1_piece_34:
        Polygon((5 - CHAMFER1_SIZE, 0), (5, CHAMFER1_SIZE_2), (5, 0), align=None)
    revolve(axis=Axis((-20, 0, 0), (0, 1, 0)), revolution_arc=90, mode=Mode.SUBTRACT)
    with BuildSketch(Plane(origin=(0, 0, -20), x_dir=(0, 0, -1), z_dir=(1, 0, 0))) as chamfer1_piece_35:
        Polygon((5 - CHAMFER1_SIZE, 0), (5, CHAMFER1_SIZE_2), (5, 0), align=None)
    revolve(axis=Axis((0, 0, -20), (0, 1, 0)), revolution_arc=90, mode=Mode.SUBTRACT)
    with BuildSketch(Plane(origin=(0, 0, 20), x_dir=(0, 0, 1), z_dir=(-1, 0, 0))) as chamfer1_piece_36:
        Polygon((5 - CHAMFER1_SIZE, 0), (5, CHAMFER1_SIZE_2), (5, 0), align=None)
    revolve(axis=Axis((0, 0, 20), (0, 1, 0)), revolution_arc=90, mode=Mode.SUBTRACT)


solid = part.part
